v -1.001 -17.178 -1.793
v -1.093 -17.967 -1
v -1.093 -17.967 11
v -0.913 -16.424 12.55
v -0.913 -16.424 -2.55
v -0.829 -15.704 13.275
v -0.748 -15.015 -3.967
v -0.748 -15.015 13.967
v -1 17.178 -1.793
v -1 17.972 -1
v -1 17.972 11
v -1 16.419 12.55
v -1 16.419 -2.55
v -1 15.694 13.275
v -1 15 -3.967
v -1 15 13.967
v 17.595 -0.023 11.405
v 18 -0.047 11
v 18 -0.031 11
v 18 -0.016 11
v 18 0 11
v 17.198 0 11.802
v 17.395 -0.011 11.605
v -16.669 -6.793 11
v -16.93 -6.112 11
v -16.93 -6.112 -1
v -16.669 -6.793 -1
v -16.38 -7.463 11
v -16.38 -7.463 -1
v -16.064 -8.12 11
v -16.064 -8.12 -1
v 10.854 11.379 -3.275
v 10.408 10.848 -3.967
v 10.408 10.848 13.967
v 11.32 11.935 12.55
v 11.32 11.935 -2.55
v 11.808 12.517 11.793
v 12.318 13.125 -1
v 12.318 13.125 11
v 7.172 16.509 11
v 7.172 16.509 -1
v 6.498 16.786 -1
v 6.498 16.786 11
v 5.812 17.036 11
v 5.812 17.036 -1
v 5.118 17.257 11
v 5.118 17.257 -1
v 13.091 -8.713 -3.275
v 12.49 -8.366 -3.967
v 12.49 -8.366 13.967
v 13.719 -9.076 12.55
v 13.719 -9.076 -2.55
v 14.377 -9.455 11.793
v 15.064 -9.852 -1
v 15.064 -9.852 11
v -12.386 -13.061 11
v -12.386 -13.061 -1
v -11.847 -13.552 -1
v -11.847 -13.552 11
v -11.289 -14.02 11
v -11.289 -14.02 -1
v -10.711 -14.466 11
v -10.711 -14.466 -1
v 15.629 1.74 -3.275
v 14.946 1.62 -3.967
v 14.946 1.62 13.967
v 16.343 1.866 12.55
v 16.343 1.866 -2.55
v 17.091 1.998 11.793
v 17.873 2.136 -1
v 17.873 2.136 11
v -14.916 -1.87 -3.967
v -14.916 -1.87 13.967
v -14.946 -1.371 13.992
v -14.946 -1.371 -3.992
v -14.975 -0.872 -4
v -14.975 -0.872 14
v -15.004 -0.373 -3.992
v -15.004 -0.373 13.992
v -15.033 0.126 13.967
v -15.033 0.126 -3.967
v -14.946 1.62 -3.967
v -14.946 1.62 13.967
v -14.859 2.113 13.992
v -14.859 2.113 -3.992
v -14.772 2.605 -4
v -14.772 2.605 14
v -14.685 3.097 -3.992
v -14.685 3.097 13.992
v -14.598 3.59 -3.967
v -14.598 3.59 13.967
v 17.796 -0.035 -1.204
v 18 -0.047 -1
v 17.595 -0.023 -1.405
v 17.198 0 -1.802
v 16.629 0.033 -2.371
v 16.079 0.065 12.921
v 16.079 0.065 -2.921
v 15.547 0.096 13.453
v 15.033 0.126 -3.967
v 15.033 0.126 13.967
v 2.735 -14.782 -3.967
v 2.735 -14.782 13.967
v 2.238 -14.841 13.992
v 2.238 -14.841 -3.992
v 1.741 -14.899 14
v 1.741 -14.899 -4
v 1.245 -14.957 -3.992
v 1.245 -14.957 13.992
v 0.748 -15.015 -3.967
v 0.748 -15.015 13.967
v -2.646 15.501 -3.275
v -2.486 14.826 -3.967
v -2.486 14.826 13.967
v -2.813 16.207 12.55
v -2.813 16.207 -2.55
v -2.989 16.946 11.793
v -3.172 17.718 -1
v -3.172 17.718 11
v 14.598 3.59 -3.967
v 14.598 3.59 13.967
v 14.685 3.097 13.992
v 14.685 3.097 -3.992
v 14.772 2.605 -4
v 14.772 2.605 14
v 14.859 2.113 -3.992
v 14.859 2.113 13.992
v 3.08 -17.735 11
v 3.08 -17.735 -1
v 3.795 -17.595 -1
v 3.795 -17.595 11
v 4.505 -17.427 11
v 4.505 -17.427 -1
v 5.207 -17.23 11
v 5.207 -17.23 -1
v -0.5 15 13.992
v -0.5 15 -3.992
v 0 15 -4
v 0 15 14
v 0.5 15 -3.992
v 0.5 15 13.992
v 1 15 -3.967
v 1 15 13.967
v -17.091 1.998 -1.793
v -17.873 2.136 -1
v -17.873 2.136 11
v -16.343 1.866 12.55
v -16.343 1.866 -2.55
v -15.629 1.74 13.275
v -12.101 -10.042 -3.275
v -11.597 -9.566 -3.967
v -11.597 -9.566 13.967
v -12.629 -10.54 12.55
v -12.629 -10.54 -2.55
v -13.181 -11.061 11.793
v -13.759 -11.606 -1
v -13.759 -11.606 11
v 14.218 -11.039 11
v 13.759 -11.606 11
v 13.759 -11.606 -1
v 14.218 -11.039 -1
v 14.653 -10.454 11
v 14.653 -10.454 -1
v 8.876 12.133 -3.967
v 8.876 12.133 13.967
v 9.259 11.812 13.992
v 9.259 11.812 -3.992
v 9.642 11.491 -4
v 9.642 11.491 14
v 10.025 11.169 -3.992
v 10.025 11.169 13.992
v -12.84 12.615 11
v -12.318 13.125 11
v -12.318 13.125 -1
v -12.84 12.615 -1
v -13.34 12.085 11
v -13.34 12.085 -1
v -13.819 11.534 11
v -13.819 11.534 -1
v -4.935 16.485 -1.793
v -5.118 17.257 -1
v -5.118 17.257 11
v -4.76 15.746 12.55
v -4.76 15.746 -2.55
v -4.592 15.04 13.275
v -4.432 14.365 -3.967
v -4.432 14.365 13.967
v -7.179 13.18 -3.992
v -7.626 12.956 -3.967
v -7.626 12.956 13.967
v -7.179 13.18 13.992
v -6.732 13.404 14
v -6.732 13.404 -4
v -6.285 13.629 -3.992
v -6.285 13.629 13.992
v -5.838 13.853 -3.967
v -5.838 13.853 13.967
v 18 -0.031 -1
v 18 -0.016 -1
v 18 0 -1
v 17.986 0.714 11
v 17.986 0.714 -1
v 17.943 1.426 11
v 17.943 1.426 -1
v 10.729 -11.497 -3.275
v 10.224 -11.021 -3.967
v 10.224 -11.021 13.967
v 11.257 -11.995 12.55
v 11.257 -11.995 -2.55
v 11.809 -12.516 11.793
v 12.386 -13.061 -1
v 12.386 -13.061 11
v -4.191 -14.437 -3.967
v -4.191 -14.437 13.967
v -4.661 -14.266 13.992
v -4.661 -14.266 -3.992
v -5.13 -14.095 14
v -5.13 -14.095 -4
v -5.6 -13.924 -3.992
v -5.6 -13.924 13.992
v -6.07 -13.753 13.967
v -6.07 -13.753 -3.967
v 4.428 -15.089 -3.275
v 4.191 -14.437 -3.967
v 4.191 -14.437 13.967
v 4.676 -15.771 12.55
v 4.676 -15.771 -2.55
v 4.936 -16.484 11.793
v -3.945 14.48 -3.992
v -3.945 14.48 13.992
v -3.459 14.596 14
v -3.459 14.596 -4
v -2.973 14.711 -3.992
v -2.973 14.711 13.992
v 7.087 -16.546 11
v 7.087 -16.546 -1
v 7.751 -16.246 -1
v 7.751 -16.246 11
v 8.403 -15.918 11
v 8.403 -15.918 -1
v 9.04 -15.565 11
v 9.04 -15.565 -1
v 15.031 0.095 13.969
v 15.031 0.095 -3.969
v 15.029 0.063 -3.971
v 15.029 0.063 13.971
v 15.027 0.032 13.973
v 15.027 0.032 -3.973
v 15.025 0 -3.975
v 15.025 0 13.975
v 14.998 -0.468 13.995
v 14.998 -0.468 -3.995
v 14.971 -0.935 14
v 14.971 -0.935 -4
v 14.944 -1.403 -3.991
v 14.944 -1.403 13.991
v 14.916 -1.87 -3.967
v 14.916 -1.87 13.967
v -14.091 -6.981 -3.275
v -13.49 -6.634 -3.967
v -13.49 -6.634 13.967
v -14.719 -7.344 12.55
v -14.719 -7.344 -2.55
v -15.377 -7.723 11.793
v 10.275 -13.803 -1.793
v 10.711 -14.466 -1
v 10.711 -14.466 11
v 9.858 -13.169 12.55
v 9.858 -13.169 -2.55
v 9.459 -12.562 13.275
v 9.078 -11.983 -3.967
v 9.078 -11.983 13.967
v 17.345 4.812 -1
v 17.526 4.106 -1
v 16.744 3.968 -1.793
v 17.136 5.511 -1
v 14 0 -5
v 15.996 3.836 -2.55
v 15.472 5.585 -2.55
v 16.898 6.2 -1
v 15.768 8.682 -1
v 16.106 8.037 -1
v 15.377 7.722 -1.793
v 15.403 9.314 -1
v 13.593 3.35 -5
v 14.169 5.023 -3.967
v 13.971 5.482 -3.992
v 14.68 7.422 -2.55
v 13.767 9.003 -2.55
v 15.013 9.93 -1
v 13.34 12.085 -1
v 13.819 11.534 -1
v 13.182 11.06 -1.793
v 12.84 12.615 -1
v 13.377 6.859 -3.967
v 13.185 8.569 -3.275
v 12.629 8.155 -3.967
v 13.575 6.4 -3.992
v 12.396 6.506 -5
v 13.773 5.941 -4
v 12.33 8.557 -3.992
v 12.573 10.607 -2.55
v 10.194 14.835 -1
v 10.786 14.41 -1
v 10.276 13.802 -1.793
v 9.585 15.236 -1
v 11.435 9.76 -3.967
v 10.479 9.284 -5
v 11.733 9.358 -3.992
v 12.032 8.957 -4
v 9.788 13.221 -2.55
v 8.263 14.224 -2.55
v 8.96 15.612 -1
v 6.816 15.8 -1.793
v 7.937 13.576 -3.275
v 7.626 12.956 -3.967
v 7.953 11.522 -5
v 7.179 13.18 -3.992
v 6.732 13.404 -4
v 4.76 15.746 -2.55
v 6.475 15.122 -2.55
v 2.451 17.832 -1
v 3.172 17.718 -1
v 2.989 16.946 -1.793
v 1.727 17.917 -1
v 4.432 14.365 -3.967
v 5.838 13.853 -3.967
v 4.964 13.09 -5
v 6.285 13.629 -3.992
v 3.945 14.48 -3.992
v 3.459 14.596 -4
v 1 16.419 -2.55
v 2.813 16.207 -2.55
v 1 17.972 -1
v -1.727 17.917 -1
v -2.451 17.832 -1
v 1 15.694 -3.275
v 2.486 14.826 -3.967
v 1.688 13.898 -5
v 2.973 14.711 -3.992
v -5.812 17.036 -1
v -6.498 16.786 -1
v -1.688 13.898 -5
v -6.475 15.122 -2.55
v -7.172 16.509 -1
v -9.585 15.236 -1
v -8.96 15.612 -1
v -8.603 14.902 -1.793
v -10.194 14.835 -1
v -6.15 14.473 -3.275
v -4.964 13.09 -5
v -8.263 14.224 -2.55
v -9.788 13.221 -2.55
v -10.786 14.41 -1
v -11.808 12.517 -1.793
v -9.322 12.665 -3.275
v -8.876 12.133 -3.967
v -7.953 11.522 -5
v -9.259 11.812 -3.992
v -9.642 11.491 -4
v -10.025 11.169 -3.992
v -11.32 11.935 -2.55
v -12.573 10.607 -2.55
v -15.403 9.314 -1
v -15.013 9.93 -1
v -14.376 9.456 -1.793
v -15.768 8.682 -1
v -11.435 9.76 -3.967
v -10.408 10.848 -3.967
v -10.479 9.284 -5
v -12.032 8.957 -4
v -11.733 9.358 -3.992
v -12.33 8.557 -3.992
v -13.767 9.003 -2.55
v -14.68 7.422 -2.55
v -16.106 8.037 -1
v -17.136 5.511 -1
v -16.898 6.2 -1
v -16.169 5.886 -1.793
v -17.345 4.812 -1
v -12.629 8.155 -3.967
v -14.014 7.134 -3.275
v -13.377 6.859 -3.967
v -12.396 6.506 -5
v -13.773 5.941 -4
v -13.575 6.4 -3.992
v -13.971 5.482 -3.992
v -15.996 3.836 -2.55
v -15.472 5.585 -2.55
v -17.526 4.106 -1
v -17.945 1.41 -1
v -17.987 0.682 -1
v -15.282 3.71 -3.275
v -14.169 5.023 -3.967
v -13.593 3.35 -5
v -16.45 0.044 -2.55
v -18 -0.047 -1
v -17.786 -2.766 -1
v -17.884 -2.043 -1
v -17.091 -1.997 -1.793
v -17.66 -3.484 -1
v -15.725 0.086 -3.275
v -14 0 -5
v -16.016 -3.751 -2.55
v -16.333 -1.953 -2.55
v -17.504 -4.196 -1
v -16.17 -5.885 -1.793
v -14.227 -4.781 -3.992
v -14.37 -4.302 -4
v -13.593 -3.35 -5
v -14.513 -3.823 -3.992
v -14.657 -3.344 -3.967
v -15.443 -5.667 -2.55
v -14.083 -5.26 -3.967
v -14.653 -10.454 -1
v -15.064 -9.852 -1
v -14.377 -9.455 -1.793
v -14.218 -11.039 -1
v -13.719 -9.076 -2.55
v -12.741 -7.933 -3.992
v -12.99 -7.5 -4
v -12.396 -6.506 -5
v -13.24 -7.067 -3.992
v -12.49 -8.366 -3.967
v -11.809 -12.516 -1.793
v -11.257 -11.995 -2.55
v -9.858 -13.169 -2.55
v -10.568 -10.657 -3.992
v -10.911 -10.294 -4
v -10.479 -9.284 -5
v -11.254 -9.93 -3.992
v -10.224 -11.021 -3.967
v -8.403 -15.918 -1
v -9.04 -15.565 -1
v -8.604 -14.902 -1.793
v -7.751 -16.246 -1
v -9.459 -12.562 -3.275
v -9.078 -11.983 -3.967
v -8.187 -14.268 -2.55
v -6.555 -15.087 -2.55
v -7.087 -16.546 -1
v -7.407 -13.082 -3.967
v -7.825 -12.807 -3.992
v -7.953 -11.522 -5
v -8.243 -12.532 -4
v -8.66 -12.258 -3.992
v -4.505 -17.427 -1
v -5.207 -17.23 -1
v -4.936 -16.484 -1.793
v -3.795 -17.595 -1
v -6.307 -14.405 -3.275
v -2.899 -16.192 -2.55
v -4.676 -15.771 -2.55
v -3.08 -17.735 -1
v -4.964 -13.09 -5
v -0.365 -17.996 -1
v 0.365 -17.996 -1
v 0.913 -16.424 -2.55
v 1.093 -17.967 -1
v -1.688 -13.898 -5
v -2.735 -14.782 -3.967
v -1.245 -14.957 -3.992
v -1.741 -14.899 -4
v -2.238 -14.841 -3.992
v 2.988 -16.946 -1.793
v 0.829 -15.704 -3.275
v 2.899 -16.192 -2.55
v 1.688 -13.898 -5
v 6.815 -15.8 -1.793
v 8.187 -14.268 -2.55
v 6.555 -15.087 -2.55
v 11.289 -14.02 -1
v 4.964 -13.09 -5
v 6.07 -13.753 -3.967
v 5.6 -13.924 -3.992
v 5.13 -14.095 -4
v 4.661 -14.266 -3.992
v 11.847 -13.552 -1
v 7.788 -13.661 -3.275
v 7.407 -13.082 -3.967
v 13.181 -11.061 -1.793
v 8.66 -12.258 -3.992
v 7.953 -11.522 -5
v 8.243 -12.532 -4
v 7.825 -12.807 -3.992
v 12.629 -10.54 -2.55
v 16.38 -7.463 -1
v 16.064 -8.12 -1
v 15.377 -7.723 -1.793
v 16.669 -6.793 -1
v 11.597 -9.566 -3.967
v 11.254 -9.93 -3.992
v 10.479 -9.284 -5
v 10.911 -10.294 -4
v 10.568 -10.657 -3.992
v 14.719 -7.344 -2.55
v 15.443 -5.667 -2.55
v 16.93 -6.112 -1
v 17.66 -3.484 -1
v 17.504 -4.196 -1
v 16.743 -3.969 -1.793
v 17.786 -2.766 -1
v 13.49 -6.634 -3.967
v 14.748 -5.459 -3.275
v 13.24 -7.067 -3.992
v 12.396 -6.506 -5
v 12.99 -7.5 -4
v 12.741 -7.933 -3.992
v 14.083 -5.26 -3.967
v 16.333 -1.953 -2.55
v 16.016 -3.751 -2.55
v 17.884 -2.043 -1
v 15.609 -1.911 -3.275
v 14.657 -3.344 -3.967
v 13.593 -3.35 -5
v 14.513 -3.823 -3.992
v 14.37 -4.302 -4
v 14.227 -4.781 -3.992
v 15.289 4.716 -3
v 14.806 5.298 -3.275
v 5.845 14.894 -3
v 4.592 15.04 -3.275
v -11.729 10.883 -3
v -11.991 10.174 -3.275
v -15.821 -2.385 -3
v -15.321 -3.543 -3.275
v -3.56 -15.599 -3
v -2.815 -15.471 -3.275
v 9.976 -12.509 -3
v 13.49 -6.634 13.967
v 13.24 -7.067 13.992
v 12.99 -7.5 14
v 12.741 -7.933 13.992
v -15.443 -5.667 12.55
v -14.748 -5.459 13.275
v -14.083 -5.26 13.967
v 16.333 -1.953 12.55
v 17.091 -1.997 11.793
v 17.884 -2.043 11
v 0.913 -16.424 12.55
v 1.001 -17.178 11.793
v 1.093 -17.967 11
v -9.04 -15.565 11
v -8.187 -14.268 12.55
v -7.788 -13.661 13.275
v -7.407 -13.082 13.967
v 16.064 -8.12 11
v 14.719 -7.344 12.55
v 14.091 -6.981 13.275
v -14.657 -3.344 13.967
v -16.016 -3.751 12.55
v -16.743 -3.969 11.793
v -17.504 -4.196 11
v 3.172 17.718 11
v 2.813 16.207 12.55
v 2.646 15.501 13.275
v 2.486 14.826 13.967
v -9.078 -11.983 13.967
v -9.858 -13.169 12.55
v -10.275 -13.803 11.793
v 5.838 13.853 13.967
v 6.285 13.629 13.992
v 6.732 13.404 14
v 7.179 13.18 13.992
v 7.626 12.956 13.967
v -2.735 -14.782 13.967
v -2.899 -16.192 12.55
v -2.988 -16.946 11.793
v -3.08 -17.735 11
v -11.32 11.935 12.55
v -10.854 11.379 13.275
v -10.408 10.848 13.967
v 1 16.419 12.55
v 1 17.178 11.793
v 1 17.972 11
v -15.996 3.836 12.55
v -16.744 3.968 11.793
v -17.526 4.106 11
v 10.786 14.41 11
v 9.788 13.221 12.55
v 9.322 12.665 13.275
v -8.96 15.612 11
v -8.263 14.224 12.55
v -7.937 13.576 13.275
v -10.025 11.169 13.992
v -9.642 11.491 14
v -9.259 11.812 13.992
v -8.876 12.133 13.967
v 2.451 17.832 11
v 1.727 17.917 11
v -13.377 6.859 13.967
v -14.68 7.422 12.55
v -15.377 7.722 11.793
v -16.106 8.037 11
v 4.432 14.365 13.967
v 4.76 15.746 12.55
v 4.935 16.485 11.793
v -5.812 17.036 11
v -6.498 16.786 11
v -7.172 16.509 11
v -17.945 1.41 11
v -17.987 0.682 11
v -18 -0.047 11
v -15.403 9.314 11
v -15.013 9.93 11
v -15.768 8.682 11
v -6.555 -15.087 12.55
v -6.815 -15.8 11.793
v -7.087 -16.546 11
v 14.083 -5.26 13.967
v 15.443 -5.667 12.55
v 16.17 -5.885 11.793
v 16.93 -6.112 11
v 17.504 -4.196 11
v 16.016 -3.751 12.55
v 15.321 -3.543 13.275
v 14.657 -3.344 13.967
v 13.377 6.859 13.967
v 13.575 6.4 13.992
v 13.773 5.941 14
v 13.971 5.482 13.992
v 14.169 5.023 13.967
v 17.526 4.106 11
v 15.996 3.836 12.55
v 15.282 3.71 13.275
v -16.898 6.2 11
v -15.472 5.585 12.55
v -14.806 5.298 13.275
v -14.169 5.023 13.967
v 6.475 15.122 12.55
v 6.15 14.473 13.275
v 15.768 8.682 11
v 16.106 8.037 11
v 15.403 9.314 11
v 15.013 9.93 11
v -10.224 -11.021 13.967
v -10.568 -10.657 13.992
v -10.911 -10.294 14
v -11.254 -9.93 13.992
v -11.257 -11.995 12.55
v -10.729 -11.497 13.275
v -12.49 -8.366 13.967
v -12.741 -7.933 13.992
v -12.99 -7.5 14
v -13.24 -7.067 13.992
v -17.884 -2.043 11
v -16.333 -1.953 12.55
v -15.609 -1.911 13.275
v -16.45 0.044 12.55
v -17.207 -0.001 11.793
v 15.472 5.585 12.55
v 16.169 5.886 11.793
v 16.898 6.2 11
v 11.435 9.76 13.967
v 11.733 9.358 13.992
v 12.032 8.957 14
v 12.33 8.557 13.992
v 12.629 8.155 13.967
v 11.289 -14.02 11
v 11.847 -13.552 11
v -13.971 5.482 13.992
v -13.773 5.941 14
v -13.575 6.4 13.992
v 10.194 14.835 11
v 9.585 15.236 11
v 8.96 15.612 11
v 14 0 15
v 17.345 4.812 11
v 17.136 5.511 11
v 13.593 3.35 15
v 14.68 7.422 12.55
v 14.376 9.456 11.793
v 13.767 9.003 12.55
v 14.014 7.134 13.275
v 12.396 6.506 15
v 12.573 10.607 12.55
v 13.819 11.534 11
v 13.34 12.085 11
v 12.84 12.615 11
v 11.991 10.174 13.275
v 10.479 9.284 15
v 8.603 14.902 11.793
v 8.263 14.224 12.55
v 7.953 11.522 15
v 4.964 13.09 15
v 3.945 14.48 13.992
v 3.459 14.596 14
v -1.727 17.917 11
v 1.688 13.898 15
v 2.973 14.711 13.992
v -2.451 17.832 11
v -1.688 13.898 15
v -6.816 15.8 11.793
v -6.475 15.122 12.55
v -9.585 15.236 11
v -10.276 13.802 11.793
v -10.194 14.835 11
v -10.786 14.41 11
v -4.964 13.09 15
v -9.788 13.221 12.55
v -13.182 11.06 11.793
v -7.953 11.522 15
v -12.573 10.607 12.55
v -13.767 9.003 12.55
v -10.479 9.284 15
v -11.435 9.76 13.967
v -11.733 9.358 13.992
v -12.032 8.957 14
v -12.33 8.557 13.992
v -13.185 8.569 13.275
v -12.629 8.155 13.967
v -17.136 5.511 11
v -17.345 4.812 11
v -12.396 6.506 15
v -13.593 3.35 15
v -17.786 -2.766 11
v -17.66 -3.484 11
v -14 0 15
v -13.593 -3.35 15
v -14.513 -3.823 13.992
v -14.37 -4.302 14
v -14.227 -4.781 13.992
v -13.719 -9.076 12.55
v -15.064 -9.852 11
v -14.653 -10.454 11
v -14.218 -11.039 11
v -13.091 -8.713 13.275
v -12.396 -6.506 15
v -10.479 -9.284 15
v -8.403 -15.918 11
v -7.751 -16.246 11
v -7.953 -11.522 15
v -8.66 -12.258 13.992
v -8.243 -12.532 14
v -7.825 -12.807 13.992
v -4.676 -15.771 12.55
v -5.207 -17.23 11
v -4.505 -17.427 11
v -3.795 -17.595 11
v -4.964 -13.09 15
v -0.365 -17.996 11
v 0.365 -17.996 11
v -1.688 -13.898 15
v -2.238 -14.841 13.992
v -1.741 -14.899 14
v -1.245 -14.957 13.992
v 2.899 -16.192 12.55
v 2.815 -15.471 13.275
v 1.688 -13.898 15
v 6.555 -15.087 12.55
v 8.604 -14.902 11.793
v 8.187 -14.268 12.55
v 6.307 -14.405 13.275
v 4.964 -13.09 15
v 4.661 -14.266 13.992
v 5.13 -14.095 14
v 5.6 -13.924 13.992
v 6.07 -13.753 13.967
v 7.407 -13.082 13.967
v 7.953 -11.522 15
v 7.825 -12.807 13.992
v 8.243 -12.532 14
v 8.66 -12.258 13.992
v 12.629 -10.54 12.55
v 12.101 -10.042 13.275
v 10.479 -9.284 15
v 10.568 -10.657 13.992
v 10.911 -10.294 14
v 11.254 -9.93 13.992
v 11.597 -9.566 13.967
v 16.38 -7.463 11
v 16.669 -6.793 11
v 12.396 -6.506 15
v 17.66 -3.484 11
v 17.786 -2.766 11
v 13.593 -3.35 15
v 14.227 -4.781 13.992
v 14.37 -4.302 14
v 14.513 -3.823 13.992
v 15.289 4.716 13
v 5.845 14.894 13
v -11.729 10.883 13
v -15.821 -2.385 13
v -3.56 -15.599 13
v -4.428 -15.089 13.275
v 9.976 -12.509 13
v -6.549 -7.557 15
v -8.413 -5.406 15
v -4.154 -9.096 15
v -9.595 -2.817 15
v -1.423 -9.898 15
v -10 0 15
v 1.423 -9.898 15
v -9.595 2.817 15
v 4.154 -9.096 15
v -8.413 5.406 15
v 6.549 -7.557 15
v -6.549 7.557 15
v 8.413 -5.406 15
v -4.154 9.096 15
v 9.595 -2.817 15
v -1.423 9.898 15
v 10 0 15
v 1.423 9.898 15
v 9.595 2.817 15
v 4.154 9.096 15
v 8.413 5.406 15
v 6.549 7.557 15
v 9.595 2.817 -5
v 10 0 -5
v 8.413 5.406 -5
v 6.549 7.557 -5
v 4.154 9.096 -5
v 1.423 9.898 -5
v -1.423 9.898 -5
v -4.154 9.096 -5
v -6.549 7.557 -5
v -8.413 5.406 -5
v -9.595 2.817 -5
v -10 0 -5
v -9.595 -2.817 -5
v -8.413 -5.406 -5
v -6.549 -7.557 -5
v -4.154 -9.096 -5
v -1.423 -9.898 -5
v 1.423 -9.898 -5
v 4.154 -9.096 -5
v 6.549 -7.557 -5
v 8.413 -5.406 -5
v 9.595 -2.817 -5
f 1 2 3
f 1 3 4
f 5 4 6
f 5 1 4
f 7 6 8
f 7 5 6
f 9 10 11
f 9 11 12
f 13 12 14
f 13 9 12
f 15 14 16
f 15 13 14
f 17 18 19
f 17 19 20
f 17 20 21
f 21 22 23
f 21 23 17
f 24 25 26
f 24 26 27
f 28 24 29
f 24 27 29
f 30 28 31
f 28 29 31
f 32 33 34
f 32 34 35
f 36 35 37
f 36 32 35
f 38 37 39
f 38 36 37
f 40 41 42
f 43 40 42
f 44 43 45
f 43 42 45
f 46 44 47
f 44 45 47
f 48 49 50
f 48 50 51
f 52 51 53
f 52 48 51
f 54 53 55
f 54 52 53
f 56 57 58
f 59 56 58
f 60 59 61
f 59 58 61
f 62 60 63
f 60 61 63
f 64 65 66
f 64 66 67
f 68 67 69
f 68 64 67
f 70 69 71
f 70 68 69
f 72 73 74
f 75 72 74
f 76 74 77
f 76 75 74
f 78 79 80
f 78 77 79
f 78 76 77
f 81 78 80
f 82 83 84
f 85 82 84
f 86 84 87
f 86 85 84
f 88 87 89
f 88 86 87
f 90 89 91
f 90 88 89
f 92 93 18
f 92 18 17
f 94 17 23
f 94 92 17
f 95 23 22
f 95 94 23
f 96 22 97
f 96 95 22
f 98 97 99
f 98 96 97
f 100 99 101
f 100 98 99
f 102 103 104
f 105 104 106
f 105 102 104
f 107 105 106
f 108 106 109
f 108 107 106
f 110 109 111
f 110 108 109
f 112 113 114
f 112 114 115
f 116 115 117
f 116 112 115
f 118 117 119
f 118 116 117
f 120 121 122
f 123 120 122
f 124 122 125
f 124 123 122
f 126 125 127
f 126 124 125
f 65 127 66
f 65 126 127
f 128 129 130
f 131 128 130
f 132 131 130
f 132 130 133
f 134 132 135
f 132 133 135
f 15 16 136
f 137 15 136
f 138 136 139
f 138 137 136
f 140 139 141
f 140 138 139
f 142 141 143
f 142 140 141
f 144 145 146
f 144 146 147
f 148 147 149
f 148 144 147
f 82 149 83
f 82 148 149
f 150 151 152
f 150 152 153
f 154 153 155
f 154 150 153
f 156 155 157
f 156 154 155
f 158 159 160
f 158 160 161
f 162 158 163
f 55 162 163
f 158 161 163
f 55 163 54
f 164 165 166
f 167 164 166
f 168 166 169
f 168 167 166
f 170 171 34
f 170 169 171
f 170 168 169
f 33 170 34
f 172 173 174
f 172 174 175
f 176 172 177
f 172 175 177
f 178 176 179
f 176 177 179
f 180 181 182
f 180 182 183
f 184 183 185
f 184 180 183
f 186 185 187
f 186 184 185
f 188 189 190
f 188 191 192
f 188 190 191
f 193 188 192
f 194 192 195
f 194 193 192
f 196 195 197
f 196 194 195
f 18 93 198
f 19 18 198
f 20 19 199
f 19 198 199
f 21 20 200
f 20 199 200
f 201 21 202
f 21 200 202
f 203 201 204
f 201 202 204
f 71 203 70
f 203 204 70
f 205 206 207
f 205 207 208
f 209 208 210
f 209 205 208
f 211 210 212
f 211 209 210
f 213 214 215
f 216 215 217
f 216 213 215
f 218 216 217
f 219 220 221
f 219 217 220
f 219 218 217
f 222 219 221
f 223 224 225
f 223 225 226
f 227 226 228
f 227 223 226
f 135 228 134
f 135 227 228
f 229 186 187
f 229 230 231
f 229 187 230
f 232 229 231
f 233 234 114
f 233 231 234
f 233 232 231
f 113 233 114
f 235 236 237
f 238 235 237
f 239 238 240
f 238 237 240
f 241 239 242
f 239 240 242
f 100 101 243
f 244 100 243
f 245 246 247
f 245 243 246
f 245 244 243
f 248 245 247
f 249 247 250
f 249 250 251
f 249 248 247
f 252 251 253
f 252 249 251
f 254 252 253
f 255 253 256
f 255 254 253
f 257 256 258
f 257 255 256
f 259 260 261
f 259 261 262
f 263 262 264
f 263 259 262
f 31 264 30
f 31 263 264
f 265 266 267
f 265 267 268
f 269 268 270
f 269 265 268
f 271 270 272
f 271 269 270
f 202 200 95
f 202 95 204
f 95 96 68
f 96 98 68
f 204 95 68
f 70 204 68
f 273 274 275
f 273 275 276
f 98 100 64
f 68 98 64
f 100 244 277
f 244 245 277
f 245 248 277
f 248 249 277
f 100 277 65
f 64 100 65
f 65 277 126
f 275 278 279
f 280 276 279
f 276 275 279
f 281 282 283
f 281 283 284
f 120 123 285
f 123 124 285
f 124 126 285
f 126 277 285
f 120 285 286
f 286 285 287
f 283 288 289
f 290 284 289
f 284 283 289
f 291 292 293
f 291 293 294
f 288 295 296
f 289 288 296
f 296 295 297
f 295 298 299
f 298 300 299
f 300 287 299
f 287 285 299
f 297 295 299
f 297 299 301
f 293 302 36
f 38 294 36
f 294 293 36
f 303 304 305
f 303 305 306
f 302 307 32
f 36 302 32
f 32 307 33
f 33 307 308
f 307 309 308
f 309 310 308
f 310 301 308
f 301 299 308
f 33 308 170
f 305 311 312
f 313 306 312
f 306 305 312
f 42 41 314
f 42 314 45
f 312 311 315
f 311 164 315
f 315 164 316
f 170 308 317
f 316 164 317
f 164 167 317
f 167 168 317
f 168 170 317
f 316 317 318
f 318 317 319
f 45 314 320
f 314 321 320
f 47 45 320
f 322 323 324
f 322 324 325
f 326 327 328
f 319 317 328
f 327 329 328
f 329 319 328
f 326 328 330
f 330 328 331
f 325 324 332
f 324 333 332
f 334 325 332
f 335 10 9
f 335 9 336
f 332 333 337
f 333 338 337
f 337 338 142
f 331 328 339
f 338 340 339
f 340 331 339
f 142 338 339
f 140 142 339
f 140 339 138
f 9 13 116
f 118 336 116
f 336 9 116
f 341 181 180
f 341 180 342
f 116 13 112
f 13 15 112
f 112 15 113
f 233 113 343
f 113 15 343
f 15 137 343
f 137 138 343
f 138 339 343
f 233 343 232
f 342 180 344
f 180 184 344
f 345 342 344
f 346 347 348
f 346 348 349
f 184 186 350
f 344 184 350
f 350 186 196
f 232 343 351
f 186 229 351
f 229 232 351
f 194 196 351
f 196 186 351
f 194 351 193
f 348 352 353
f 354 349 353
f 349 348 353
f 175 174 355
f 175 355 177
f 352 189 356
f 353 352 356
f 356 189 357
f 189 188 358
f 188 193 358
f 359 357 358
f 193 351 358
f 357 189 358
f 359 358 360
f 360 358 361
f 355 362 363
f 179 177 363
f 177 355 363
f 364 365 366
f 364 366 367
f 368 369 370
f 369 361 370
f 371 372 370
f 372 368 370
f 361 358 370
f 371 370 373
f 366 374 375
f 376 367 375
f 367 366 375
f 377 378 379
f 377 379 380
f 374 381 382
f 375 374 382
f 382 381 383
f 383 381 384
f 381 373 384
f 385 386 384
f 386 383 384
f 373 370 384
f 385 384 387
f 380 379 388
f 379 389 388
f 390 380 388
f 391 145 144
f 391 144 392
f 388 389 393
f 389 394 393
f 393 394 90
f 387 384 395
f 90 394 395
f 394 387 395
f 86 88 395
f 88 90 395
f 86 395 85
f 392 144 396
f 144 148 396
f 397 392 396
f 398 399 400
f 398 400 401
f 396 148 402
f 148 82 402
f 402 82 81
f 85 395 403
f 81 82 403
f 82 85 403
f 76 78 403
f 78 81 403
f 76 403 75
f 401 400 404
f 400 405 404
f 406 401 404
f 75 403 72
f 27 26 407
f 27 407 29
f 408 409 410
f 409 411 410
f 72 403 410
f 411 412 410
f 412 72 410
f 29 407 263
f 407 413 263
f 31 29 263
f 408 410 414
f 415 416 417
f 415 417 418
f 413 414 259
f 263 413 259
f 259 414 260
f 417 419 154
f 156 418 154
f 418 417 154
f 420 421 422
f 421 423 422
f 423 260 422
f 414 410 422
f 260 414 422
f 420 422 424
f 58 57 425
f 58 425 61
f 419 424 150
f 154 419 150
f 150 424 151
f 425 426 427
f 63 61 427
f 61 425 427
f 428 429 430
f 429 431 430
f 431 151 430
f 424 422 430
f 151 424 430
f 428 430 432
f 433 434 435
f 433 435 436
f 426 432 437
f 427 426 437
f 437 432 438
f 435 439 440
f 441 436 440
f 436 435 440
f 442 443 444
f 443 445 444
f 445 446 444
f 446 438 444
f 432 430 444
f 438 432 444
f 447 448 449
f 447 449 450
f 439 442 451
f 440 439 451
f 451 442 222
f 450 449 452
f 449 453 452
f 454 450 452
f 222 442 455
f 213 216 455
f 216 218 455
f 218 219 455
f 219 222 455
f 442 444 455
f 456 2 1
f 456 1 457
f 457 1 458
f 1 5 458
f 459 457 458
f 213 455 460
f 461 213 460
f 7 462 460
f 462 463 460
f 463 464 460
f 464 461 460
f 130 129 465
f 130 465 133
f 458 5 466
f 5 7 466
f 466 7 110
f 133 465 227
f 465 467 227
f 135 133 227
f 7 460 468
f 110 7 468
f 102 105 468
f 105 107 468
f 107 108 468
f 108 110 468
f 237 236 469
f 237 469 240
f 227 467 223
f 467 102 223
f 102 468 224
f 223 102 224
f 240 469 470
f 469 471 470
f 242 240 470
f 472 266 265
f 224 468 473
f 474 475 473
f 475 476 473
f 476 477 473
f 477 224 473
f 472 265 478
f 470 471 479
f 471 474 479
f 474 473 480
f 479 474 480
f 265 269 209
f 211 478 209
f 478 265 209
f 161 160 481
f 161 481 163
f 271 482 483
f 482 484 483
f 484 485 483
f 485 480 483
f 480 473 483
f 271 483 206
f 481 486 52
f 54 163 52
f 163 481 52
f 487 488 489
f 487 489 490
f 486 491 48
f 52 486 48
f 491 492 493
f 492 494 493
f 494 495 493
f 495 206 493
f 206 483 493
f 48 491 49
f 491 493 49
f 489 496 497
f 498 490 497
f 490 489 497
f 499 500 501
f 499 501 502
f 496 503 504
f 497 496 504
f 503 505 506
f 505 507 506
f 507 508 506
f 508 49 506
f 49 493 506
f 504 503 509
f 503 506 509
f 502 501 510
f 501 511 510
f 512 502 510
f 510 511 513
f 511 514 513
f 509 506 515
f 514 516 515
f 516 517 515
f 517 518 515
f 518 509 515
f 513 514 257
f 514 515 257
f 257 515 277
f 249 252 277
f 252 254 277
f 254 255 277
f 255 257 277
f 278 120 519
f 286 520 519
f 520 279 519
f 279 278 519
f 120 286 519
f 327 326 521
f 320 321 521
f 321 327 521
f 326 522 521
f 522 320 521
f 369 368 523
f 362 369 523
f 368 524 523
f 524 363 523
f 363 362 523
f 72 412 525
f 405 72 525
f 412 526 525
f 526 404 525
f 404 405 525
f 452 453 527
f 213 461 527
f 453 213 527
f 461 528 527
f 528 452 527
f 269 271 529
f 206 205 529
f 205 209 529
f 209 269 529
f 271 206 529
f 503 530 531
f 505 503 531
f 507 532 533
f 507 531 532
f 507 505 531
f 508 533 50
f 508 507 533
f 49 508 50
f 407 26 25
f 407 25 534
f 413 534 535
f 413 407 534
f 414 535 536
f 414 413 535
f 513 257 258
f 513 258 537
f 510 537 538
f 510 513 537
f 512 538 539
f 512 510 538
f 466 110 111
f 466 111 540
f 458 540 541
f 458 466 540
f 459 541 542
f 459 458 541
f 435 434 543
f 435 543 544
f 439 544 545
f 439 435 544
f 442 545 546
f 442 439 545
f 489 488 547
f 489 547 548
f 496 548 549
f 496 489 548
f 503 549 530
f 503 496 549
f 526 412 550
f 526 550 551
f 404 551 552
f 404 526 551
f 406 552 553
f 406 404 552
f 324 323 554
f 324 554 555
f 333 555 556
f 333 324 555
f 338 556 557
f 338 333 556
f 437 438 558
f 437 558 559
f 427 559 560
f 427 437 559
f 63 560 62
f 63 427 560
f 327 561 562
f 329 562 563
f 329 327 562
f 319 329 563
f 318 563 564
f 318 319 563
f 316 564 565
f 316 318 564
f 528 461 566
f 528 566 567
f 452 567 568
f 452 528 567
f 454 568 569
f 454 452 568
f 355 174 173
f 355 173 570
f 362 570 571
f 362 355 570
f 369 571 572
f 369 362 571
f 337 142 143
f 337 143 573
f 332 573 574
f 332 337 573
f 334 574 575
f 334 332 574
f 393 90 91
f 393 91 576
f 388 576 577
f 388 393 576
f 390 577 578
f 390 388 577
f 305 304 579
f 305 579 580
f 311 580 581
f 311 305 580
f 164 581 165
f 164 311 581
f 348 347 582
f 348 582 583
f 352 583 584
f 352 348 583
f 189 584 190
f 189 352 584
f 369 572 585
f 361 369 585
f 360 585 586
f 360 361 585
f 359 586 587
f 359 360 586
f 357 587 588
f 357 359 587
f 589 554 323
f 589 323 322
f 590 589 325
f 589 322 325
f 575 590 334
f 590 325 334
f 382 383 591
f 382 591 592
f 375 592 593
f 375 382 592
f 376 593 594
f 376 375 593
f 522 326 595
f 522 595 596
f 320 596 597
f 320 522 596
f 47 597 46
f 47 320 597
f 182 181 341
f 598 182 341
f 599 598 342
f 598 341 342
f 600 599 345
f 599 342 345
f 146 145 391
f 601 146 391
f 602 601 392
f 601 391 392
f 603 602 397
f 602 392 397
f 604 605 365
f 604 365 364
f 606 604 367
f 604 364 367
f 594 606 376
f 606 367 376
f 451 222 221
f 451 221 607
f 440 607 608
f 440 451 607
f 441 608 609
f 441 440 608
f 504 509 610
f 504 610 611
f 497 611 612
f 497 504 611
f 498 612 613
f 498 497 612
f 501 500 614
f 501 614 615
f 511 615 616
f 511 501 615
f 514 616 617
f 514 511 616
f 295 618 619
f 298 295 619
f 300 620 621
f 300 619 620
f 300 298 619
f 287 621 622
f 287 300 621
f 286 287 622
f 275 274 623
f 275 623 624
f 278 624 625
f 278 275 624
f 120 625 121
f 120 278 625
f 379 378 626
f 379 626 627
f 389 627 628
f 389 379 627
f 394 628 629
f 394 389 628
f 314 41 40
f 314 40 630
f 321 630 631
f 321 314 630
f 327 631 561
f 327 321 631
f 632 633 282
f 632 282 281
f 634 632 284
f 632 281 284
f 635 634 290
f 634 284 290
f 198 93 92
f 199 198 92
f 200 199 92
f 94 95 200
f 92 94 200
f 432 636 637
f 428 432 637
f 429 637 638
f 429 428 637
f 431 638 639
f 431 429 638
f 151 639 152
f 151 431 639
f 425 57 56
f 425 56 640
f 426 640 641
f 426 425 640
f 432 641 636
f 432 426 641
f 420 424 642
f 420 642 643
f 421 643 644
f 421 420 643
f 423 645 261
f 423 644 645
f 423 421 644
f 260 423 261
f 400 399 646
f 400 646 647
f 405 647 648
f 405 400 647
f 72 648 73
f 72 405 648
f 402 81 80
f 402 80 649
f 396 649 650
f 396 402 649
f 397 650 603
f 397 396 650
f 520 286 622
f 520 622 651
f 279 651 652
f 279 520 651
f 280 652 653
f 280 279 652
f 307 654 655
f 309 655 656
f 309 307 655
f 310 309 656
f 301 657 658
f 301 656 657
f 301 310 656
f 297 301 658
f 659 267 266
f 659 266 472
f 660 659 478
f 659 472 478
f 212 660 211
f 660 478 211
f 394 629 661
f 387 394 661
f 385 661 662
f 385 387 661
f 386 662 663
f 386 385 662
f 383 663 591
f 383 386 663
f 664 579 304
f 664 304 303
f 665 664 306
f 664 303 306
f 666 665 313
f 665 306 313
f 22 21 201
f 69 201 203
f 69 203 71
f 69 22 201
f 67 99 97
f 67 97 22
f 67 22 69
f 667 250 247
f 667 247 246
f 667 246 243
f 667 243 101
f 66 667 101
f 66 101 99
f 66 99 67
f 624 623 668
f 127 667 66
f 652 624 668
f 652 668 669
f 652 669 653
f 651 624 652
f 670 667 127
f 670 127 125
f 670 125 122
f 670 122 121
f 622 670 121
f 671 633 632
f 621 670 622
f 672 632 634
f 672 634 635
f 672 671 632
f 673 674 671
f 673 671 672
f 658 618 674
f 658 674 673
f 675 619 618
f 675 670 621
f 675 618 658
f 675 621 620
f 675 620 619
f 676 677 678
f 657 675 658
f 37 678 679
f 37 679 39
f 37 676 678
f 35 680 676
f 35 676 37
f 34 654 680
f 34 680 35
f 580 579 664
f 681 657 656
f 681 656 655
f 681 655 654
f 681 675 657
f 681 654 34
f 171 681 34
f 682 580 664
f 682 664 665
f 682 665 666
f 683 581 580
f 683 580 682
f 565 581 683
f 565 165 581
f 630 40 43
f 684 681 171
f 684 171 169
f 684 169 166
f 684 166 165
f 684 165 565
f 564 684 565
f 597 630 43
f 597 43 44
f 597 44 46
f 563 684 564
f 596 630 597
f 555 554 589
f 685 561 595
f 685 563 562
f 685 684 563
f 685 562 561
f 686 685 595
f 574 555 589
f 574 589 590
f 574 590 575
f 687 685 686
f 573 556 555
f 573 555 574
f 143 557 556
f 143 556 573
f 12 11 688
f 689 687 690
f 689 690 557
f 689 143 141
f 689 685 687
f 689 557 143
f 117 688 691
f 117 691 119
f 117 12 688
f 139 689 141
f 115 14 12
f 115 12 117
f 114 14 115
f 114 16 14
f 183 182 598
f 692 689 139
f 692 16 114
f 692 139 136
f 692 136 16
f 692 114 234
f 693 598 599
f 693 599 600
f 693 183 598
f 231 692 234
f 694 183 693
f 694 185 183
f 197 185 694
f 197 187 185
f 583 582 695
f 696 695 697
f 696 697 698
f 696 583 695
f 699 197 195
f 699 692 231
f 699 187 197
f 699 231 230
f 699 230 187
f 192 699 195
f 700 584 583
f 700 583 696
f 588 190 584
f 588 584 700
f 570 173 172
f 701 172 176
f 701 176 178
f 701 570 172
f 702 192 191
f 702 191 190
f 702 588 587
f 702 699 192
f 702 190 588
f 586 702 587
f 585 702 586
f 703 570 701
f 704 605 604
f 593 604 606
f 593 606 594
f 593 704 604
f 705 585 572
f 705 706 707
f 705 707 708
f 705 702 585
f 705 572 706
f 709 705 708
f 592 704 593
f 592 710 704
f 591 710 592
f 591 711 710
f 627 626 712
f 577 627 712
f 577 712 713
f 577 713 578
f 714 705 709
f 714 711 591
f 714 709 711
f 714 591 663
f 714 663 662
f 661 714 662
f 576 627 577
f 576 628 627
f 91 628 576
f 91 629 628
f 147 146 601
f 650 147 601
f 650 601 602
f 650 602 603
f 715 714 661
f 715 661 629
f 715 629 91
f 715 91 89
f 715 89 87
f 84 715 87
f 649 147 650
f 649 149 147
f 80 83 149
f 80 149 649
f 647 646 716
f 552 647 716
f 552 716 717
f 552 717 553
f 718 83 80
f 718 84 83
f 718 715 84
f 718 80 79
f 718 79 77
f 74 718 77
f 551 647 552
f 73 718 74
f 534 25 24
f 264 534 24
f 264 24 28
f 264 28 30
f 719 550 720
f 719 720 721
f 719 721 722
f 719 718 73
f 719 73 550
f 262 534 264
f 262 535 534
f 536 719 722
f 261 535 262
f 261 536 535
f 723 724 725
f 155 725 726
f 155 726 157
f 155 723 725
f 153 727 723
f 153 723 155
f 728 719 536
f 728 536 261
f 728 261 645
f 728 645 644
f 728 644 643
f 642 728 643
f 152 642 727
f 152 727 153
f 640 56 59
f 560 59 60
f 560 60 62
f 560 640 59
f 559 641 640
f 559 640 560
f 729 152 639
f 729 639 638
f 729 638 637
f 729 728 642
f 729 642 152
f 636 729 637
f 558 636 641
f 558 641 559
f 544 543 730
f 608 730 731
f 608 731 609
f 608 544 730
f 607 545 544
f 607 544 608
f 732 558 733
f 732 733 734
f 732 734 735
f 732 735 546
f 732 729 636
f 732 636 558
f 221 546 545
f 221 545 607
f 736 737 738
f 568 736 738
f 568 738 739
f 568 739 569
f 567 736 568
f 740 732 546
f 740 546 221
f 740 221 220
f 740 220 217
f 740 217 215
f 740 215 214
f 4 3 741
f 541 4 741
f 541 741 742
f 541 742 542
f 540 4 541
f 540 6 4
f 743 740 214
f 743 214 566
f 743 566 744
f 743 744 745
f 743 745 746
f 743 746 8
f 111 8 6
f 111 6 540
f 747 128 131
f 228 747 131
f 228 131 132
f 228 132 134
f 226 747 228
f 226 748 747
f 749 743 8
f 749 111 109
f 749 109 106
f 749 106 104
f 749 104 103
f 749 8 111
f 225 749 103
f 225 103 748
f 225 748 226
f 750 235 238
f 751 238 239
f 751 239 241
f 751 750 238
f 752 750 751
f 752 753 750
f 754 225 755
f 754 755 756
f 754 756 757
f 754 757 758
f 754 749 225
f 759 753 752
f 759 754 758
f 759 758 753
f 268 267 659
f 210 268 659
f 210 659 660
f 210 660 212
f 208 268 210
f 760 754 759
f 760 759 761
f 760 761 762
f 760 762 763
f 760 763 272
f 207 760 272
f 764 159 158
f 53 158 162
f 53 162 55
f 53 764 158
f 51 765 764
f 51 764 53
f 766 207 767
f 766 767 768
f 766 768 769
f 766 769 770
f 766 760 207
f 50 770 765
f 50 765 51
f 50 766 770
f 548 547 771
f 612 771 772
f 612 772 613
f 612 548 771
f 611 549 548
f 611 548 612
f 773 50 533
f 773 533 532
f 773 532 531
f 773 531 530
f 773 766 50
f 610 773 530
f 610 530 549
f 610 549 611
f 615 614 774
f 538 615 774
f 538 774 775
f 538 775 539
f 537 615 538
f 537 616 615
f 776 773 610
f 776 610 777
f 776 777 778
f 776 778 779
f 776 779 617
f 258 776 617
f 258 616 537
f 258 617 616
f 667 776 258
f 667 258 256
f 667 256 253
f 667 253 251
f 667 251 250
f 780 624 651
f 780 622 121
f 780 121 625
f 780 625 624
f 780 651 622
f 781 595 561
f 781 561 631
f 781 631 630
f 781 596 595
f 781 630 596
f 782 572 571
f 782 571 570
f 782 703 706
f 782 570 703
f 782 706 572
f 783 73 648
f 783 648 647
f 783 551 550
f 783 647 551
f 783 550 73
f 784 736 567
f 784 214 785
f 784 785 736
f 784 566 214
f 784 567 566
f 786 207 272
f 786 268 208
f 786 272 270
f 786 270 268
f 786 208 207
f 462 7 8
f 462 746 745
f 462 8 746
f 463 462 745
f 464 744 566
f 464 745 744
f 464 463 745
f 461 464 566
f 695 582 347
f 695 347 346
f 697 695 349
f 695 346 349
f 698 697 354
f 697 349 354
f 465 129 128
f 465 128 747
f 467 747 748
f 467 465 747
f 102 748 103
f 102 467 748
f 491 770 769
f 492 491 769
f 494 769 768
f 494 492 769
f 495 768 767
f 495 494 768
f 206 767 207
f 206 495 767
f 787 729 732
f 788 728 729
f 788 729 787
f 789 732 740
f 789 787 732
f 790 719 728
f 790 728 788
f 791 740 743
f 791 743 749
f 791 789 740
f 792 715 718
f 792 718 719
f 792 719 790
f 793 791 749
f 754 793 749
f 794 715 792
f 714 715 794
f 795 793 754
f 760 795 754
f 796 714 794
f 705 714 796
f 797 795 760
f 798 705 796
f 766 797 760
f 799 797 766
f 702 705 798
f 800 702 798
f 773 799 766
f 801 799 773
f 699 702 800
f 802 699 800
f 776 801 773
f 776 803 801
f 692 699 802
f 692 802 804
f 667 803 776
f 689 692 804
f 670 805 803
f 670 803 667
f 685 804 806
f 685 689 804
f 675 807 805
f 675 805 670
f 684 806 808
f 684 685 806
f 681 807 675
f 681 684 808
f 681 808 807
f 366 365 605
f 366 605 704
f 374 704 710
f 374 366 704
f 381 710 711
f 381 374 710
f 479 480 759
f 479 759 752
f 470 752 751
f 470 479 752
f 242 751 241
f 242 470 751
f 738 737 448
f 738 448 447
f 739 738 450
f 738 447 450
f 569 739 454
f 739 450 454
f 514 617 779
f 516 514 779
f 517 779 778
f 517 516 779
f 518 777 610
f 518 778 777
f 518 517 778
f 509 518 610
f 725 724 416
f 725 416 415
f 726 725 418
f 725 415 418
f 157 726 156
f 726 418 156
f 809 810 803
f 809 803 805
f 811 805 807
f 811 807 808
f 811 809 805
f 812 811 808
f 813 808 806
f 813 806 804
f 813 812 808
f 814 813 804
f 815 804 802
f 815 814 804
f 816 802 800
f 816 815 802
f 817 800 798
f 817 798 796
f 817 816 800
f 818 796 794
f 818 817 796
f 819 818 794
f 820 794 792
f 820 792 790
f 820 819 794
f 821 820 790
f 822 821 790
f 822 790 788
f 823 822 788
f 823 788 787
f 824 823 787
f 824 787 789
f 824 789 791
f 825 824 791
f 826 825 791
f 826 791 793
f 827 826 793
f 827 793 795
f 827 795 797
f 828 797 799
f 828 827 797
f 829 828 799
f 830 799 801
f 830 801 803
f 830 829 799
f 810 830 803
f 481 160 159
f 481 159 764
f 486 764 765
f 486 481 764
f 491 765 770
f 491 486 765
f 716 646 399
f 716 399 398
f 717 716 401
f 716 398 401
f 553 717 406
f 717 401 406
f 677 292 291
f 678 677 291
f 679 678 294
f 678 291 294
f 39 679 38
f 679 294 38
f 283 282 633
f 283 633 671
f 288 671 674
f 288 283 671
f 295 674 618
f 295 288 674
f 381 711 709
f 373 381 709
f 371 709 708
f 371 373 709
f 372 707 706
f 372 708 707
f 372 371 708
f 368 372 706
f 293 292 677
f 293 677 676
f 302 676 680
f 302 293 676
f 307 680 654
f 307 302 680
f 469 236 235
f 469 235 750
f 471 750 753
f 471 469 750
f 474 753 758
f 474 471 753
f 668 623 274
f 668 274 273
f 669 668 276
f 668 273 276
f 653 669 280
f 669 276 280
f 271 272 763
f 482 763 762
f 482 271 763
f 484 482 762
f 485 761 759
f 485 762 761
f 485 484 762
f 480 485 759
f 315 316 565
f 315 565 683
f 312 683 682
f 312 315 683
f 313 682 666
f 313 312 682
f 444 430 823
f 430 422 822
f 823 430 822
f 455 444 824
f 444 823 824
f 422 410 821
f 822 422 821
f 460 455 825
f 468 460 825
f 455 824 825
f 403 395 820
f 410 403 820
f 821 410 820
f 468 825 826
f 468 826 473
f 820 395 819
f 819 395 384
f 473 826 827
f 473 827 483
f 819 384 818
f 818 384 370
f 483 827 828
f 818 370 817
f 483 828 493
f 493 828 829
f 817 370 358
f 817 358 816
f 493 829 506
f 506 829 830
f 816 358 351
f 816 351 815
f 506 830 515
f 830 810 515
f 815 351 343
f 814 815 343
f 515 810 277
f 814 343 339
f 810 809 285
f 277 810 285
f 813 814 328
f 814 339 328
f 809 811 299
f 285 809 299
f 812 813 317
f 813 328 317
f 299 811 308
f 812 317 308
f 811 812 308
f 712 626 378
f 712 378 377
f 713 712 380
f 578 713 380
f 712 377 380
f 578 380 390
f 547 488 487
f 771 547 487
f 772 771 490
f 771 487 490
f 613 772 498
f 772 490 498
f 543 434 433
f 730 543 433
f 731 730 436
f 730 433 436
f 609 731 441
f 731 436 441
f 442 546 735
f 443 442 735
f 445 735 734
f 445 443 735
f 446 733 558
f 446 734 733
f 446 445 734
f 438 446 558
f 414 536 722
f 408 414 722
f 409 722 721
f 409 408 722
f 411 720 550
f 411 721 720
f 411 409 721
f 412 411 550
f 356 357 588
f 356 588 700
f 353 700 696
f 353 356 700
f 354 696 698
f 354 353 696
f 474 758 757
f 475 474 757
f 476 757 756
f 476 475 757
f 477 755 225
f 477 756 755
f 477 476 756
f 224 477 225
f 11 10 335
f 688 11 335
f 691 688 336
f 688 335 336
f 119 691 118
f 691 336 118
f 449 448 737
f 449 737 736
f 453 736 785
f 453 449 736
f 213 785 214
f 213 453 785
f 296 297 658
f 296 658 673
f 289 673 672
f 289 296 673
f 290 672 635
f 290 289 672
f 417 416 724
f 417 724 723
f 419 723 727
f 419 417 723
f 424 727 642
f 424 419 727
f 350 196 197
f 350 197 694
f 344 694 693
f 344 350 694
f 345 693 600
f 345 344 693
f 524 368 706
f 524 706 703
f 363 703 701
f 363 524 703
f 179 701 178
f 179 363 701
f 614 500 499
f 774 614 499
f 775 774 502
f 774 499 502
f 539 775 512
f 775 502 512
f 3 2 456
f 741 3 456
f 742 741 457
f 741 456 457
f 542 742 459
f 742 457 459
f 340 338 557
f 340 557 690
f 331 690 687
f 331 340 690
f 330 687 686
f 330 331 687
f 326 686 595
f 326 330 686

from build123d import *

# Parameters (mm, degrees)
SKETCH1_R           = 9
SKETCH1_R_2         = 5
BOSS_EXTRUDE1_DEPTH = 10
CHAMFER1_SIZE       = 2
CUT_EXTRUDE1_DEPTH  = 11
CIRPATTERN1_COUNT   = 27
SCALE1_SCALE        = 2


with BuildPart() as part:
    # Sketch1 → Boss-Extrude1 (new body)
    with BuildSketch(Plane.XY):
        Circle(SKETCH1_R)
        Circle(SKETCH1_R_2, mode=Mode.SUBTRACT)
    extrude(amount=BOSS_EXTRUDE1_DEPTH)

    # Chamfer1
    chamfer1_edges = [part.edges().sort_by_distance(p)[0] for p in [
        (-9, 0, 0),
        (-9, 0, 10),
    ]]
    chamfer(chamfer1_edges, length=CHAMFER1_SIZE)

    # Sketch2 → Cut-Extrude1 (cut, through all)
    with BuildSketch(Plane.XY):
        with BuildLine():
            Line((0.5, 7.5), (0.5, 8.986100378))
            ThreePointArc((0.5, 8.986100378), (0, 9), (-0.5, 8.986100378))
            Line((-0.5, 8.986100378), (-0.5, 7.5))
            Line((-0.5, 7.5), (0.5, 7.5))
        make_face()
    cut_extrude1 = extrude(amount=CUT_EXTRUDE1_DEPTH, mode=Mode.SUBTRACT)

    # CirPattern1: Cut-Extrude1 ×27 about axis
    cirpattern1_axis = Axis((0, 0, 0), (0, 0, 1))
    for i in range(1, CIRPATTERN1_COUNT):
        add(cut_extrude1.rotate(cirpattern1_axis, i * 360 / CIRPATTERN1_COUNT), mode=Mode.SUBTRACT)


with BuildPart() as part_1:
    # Scale1: scaled about (0, 0, 5)
    add(part.part.scale(SCALE1_SCALE).moved(Location((0, 0, -5))))


solid = part_1.part
